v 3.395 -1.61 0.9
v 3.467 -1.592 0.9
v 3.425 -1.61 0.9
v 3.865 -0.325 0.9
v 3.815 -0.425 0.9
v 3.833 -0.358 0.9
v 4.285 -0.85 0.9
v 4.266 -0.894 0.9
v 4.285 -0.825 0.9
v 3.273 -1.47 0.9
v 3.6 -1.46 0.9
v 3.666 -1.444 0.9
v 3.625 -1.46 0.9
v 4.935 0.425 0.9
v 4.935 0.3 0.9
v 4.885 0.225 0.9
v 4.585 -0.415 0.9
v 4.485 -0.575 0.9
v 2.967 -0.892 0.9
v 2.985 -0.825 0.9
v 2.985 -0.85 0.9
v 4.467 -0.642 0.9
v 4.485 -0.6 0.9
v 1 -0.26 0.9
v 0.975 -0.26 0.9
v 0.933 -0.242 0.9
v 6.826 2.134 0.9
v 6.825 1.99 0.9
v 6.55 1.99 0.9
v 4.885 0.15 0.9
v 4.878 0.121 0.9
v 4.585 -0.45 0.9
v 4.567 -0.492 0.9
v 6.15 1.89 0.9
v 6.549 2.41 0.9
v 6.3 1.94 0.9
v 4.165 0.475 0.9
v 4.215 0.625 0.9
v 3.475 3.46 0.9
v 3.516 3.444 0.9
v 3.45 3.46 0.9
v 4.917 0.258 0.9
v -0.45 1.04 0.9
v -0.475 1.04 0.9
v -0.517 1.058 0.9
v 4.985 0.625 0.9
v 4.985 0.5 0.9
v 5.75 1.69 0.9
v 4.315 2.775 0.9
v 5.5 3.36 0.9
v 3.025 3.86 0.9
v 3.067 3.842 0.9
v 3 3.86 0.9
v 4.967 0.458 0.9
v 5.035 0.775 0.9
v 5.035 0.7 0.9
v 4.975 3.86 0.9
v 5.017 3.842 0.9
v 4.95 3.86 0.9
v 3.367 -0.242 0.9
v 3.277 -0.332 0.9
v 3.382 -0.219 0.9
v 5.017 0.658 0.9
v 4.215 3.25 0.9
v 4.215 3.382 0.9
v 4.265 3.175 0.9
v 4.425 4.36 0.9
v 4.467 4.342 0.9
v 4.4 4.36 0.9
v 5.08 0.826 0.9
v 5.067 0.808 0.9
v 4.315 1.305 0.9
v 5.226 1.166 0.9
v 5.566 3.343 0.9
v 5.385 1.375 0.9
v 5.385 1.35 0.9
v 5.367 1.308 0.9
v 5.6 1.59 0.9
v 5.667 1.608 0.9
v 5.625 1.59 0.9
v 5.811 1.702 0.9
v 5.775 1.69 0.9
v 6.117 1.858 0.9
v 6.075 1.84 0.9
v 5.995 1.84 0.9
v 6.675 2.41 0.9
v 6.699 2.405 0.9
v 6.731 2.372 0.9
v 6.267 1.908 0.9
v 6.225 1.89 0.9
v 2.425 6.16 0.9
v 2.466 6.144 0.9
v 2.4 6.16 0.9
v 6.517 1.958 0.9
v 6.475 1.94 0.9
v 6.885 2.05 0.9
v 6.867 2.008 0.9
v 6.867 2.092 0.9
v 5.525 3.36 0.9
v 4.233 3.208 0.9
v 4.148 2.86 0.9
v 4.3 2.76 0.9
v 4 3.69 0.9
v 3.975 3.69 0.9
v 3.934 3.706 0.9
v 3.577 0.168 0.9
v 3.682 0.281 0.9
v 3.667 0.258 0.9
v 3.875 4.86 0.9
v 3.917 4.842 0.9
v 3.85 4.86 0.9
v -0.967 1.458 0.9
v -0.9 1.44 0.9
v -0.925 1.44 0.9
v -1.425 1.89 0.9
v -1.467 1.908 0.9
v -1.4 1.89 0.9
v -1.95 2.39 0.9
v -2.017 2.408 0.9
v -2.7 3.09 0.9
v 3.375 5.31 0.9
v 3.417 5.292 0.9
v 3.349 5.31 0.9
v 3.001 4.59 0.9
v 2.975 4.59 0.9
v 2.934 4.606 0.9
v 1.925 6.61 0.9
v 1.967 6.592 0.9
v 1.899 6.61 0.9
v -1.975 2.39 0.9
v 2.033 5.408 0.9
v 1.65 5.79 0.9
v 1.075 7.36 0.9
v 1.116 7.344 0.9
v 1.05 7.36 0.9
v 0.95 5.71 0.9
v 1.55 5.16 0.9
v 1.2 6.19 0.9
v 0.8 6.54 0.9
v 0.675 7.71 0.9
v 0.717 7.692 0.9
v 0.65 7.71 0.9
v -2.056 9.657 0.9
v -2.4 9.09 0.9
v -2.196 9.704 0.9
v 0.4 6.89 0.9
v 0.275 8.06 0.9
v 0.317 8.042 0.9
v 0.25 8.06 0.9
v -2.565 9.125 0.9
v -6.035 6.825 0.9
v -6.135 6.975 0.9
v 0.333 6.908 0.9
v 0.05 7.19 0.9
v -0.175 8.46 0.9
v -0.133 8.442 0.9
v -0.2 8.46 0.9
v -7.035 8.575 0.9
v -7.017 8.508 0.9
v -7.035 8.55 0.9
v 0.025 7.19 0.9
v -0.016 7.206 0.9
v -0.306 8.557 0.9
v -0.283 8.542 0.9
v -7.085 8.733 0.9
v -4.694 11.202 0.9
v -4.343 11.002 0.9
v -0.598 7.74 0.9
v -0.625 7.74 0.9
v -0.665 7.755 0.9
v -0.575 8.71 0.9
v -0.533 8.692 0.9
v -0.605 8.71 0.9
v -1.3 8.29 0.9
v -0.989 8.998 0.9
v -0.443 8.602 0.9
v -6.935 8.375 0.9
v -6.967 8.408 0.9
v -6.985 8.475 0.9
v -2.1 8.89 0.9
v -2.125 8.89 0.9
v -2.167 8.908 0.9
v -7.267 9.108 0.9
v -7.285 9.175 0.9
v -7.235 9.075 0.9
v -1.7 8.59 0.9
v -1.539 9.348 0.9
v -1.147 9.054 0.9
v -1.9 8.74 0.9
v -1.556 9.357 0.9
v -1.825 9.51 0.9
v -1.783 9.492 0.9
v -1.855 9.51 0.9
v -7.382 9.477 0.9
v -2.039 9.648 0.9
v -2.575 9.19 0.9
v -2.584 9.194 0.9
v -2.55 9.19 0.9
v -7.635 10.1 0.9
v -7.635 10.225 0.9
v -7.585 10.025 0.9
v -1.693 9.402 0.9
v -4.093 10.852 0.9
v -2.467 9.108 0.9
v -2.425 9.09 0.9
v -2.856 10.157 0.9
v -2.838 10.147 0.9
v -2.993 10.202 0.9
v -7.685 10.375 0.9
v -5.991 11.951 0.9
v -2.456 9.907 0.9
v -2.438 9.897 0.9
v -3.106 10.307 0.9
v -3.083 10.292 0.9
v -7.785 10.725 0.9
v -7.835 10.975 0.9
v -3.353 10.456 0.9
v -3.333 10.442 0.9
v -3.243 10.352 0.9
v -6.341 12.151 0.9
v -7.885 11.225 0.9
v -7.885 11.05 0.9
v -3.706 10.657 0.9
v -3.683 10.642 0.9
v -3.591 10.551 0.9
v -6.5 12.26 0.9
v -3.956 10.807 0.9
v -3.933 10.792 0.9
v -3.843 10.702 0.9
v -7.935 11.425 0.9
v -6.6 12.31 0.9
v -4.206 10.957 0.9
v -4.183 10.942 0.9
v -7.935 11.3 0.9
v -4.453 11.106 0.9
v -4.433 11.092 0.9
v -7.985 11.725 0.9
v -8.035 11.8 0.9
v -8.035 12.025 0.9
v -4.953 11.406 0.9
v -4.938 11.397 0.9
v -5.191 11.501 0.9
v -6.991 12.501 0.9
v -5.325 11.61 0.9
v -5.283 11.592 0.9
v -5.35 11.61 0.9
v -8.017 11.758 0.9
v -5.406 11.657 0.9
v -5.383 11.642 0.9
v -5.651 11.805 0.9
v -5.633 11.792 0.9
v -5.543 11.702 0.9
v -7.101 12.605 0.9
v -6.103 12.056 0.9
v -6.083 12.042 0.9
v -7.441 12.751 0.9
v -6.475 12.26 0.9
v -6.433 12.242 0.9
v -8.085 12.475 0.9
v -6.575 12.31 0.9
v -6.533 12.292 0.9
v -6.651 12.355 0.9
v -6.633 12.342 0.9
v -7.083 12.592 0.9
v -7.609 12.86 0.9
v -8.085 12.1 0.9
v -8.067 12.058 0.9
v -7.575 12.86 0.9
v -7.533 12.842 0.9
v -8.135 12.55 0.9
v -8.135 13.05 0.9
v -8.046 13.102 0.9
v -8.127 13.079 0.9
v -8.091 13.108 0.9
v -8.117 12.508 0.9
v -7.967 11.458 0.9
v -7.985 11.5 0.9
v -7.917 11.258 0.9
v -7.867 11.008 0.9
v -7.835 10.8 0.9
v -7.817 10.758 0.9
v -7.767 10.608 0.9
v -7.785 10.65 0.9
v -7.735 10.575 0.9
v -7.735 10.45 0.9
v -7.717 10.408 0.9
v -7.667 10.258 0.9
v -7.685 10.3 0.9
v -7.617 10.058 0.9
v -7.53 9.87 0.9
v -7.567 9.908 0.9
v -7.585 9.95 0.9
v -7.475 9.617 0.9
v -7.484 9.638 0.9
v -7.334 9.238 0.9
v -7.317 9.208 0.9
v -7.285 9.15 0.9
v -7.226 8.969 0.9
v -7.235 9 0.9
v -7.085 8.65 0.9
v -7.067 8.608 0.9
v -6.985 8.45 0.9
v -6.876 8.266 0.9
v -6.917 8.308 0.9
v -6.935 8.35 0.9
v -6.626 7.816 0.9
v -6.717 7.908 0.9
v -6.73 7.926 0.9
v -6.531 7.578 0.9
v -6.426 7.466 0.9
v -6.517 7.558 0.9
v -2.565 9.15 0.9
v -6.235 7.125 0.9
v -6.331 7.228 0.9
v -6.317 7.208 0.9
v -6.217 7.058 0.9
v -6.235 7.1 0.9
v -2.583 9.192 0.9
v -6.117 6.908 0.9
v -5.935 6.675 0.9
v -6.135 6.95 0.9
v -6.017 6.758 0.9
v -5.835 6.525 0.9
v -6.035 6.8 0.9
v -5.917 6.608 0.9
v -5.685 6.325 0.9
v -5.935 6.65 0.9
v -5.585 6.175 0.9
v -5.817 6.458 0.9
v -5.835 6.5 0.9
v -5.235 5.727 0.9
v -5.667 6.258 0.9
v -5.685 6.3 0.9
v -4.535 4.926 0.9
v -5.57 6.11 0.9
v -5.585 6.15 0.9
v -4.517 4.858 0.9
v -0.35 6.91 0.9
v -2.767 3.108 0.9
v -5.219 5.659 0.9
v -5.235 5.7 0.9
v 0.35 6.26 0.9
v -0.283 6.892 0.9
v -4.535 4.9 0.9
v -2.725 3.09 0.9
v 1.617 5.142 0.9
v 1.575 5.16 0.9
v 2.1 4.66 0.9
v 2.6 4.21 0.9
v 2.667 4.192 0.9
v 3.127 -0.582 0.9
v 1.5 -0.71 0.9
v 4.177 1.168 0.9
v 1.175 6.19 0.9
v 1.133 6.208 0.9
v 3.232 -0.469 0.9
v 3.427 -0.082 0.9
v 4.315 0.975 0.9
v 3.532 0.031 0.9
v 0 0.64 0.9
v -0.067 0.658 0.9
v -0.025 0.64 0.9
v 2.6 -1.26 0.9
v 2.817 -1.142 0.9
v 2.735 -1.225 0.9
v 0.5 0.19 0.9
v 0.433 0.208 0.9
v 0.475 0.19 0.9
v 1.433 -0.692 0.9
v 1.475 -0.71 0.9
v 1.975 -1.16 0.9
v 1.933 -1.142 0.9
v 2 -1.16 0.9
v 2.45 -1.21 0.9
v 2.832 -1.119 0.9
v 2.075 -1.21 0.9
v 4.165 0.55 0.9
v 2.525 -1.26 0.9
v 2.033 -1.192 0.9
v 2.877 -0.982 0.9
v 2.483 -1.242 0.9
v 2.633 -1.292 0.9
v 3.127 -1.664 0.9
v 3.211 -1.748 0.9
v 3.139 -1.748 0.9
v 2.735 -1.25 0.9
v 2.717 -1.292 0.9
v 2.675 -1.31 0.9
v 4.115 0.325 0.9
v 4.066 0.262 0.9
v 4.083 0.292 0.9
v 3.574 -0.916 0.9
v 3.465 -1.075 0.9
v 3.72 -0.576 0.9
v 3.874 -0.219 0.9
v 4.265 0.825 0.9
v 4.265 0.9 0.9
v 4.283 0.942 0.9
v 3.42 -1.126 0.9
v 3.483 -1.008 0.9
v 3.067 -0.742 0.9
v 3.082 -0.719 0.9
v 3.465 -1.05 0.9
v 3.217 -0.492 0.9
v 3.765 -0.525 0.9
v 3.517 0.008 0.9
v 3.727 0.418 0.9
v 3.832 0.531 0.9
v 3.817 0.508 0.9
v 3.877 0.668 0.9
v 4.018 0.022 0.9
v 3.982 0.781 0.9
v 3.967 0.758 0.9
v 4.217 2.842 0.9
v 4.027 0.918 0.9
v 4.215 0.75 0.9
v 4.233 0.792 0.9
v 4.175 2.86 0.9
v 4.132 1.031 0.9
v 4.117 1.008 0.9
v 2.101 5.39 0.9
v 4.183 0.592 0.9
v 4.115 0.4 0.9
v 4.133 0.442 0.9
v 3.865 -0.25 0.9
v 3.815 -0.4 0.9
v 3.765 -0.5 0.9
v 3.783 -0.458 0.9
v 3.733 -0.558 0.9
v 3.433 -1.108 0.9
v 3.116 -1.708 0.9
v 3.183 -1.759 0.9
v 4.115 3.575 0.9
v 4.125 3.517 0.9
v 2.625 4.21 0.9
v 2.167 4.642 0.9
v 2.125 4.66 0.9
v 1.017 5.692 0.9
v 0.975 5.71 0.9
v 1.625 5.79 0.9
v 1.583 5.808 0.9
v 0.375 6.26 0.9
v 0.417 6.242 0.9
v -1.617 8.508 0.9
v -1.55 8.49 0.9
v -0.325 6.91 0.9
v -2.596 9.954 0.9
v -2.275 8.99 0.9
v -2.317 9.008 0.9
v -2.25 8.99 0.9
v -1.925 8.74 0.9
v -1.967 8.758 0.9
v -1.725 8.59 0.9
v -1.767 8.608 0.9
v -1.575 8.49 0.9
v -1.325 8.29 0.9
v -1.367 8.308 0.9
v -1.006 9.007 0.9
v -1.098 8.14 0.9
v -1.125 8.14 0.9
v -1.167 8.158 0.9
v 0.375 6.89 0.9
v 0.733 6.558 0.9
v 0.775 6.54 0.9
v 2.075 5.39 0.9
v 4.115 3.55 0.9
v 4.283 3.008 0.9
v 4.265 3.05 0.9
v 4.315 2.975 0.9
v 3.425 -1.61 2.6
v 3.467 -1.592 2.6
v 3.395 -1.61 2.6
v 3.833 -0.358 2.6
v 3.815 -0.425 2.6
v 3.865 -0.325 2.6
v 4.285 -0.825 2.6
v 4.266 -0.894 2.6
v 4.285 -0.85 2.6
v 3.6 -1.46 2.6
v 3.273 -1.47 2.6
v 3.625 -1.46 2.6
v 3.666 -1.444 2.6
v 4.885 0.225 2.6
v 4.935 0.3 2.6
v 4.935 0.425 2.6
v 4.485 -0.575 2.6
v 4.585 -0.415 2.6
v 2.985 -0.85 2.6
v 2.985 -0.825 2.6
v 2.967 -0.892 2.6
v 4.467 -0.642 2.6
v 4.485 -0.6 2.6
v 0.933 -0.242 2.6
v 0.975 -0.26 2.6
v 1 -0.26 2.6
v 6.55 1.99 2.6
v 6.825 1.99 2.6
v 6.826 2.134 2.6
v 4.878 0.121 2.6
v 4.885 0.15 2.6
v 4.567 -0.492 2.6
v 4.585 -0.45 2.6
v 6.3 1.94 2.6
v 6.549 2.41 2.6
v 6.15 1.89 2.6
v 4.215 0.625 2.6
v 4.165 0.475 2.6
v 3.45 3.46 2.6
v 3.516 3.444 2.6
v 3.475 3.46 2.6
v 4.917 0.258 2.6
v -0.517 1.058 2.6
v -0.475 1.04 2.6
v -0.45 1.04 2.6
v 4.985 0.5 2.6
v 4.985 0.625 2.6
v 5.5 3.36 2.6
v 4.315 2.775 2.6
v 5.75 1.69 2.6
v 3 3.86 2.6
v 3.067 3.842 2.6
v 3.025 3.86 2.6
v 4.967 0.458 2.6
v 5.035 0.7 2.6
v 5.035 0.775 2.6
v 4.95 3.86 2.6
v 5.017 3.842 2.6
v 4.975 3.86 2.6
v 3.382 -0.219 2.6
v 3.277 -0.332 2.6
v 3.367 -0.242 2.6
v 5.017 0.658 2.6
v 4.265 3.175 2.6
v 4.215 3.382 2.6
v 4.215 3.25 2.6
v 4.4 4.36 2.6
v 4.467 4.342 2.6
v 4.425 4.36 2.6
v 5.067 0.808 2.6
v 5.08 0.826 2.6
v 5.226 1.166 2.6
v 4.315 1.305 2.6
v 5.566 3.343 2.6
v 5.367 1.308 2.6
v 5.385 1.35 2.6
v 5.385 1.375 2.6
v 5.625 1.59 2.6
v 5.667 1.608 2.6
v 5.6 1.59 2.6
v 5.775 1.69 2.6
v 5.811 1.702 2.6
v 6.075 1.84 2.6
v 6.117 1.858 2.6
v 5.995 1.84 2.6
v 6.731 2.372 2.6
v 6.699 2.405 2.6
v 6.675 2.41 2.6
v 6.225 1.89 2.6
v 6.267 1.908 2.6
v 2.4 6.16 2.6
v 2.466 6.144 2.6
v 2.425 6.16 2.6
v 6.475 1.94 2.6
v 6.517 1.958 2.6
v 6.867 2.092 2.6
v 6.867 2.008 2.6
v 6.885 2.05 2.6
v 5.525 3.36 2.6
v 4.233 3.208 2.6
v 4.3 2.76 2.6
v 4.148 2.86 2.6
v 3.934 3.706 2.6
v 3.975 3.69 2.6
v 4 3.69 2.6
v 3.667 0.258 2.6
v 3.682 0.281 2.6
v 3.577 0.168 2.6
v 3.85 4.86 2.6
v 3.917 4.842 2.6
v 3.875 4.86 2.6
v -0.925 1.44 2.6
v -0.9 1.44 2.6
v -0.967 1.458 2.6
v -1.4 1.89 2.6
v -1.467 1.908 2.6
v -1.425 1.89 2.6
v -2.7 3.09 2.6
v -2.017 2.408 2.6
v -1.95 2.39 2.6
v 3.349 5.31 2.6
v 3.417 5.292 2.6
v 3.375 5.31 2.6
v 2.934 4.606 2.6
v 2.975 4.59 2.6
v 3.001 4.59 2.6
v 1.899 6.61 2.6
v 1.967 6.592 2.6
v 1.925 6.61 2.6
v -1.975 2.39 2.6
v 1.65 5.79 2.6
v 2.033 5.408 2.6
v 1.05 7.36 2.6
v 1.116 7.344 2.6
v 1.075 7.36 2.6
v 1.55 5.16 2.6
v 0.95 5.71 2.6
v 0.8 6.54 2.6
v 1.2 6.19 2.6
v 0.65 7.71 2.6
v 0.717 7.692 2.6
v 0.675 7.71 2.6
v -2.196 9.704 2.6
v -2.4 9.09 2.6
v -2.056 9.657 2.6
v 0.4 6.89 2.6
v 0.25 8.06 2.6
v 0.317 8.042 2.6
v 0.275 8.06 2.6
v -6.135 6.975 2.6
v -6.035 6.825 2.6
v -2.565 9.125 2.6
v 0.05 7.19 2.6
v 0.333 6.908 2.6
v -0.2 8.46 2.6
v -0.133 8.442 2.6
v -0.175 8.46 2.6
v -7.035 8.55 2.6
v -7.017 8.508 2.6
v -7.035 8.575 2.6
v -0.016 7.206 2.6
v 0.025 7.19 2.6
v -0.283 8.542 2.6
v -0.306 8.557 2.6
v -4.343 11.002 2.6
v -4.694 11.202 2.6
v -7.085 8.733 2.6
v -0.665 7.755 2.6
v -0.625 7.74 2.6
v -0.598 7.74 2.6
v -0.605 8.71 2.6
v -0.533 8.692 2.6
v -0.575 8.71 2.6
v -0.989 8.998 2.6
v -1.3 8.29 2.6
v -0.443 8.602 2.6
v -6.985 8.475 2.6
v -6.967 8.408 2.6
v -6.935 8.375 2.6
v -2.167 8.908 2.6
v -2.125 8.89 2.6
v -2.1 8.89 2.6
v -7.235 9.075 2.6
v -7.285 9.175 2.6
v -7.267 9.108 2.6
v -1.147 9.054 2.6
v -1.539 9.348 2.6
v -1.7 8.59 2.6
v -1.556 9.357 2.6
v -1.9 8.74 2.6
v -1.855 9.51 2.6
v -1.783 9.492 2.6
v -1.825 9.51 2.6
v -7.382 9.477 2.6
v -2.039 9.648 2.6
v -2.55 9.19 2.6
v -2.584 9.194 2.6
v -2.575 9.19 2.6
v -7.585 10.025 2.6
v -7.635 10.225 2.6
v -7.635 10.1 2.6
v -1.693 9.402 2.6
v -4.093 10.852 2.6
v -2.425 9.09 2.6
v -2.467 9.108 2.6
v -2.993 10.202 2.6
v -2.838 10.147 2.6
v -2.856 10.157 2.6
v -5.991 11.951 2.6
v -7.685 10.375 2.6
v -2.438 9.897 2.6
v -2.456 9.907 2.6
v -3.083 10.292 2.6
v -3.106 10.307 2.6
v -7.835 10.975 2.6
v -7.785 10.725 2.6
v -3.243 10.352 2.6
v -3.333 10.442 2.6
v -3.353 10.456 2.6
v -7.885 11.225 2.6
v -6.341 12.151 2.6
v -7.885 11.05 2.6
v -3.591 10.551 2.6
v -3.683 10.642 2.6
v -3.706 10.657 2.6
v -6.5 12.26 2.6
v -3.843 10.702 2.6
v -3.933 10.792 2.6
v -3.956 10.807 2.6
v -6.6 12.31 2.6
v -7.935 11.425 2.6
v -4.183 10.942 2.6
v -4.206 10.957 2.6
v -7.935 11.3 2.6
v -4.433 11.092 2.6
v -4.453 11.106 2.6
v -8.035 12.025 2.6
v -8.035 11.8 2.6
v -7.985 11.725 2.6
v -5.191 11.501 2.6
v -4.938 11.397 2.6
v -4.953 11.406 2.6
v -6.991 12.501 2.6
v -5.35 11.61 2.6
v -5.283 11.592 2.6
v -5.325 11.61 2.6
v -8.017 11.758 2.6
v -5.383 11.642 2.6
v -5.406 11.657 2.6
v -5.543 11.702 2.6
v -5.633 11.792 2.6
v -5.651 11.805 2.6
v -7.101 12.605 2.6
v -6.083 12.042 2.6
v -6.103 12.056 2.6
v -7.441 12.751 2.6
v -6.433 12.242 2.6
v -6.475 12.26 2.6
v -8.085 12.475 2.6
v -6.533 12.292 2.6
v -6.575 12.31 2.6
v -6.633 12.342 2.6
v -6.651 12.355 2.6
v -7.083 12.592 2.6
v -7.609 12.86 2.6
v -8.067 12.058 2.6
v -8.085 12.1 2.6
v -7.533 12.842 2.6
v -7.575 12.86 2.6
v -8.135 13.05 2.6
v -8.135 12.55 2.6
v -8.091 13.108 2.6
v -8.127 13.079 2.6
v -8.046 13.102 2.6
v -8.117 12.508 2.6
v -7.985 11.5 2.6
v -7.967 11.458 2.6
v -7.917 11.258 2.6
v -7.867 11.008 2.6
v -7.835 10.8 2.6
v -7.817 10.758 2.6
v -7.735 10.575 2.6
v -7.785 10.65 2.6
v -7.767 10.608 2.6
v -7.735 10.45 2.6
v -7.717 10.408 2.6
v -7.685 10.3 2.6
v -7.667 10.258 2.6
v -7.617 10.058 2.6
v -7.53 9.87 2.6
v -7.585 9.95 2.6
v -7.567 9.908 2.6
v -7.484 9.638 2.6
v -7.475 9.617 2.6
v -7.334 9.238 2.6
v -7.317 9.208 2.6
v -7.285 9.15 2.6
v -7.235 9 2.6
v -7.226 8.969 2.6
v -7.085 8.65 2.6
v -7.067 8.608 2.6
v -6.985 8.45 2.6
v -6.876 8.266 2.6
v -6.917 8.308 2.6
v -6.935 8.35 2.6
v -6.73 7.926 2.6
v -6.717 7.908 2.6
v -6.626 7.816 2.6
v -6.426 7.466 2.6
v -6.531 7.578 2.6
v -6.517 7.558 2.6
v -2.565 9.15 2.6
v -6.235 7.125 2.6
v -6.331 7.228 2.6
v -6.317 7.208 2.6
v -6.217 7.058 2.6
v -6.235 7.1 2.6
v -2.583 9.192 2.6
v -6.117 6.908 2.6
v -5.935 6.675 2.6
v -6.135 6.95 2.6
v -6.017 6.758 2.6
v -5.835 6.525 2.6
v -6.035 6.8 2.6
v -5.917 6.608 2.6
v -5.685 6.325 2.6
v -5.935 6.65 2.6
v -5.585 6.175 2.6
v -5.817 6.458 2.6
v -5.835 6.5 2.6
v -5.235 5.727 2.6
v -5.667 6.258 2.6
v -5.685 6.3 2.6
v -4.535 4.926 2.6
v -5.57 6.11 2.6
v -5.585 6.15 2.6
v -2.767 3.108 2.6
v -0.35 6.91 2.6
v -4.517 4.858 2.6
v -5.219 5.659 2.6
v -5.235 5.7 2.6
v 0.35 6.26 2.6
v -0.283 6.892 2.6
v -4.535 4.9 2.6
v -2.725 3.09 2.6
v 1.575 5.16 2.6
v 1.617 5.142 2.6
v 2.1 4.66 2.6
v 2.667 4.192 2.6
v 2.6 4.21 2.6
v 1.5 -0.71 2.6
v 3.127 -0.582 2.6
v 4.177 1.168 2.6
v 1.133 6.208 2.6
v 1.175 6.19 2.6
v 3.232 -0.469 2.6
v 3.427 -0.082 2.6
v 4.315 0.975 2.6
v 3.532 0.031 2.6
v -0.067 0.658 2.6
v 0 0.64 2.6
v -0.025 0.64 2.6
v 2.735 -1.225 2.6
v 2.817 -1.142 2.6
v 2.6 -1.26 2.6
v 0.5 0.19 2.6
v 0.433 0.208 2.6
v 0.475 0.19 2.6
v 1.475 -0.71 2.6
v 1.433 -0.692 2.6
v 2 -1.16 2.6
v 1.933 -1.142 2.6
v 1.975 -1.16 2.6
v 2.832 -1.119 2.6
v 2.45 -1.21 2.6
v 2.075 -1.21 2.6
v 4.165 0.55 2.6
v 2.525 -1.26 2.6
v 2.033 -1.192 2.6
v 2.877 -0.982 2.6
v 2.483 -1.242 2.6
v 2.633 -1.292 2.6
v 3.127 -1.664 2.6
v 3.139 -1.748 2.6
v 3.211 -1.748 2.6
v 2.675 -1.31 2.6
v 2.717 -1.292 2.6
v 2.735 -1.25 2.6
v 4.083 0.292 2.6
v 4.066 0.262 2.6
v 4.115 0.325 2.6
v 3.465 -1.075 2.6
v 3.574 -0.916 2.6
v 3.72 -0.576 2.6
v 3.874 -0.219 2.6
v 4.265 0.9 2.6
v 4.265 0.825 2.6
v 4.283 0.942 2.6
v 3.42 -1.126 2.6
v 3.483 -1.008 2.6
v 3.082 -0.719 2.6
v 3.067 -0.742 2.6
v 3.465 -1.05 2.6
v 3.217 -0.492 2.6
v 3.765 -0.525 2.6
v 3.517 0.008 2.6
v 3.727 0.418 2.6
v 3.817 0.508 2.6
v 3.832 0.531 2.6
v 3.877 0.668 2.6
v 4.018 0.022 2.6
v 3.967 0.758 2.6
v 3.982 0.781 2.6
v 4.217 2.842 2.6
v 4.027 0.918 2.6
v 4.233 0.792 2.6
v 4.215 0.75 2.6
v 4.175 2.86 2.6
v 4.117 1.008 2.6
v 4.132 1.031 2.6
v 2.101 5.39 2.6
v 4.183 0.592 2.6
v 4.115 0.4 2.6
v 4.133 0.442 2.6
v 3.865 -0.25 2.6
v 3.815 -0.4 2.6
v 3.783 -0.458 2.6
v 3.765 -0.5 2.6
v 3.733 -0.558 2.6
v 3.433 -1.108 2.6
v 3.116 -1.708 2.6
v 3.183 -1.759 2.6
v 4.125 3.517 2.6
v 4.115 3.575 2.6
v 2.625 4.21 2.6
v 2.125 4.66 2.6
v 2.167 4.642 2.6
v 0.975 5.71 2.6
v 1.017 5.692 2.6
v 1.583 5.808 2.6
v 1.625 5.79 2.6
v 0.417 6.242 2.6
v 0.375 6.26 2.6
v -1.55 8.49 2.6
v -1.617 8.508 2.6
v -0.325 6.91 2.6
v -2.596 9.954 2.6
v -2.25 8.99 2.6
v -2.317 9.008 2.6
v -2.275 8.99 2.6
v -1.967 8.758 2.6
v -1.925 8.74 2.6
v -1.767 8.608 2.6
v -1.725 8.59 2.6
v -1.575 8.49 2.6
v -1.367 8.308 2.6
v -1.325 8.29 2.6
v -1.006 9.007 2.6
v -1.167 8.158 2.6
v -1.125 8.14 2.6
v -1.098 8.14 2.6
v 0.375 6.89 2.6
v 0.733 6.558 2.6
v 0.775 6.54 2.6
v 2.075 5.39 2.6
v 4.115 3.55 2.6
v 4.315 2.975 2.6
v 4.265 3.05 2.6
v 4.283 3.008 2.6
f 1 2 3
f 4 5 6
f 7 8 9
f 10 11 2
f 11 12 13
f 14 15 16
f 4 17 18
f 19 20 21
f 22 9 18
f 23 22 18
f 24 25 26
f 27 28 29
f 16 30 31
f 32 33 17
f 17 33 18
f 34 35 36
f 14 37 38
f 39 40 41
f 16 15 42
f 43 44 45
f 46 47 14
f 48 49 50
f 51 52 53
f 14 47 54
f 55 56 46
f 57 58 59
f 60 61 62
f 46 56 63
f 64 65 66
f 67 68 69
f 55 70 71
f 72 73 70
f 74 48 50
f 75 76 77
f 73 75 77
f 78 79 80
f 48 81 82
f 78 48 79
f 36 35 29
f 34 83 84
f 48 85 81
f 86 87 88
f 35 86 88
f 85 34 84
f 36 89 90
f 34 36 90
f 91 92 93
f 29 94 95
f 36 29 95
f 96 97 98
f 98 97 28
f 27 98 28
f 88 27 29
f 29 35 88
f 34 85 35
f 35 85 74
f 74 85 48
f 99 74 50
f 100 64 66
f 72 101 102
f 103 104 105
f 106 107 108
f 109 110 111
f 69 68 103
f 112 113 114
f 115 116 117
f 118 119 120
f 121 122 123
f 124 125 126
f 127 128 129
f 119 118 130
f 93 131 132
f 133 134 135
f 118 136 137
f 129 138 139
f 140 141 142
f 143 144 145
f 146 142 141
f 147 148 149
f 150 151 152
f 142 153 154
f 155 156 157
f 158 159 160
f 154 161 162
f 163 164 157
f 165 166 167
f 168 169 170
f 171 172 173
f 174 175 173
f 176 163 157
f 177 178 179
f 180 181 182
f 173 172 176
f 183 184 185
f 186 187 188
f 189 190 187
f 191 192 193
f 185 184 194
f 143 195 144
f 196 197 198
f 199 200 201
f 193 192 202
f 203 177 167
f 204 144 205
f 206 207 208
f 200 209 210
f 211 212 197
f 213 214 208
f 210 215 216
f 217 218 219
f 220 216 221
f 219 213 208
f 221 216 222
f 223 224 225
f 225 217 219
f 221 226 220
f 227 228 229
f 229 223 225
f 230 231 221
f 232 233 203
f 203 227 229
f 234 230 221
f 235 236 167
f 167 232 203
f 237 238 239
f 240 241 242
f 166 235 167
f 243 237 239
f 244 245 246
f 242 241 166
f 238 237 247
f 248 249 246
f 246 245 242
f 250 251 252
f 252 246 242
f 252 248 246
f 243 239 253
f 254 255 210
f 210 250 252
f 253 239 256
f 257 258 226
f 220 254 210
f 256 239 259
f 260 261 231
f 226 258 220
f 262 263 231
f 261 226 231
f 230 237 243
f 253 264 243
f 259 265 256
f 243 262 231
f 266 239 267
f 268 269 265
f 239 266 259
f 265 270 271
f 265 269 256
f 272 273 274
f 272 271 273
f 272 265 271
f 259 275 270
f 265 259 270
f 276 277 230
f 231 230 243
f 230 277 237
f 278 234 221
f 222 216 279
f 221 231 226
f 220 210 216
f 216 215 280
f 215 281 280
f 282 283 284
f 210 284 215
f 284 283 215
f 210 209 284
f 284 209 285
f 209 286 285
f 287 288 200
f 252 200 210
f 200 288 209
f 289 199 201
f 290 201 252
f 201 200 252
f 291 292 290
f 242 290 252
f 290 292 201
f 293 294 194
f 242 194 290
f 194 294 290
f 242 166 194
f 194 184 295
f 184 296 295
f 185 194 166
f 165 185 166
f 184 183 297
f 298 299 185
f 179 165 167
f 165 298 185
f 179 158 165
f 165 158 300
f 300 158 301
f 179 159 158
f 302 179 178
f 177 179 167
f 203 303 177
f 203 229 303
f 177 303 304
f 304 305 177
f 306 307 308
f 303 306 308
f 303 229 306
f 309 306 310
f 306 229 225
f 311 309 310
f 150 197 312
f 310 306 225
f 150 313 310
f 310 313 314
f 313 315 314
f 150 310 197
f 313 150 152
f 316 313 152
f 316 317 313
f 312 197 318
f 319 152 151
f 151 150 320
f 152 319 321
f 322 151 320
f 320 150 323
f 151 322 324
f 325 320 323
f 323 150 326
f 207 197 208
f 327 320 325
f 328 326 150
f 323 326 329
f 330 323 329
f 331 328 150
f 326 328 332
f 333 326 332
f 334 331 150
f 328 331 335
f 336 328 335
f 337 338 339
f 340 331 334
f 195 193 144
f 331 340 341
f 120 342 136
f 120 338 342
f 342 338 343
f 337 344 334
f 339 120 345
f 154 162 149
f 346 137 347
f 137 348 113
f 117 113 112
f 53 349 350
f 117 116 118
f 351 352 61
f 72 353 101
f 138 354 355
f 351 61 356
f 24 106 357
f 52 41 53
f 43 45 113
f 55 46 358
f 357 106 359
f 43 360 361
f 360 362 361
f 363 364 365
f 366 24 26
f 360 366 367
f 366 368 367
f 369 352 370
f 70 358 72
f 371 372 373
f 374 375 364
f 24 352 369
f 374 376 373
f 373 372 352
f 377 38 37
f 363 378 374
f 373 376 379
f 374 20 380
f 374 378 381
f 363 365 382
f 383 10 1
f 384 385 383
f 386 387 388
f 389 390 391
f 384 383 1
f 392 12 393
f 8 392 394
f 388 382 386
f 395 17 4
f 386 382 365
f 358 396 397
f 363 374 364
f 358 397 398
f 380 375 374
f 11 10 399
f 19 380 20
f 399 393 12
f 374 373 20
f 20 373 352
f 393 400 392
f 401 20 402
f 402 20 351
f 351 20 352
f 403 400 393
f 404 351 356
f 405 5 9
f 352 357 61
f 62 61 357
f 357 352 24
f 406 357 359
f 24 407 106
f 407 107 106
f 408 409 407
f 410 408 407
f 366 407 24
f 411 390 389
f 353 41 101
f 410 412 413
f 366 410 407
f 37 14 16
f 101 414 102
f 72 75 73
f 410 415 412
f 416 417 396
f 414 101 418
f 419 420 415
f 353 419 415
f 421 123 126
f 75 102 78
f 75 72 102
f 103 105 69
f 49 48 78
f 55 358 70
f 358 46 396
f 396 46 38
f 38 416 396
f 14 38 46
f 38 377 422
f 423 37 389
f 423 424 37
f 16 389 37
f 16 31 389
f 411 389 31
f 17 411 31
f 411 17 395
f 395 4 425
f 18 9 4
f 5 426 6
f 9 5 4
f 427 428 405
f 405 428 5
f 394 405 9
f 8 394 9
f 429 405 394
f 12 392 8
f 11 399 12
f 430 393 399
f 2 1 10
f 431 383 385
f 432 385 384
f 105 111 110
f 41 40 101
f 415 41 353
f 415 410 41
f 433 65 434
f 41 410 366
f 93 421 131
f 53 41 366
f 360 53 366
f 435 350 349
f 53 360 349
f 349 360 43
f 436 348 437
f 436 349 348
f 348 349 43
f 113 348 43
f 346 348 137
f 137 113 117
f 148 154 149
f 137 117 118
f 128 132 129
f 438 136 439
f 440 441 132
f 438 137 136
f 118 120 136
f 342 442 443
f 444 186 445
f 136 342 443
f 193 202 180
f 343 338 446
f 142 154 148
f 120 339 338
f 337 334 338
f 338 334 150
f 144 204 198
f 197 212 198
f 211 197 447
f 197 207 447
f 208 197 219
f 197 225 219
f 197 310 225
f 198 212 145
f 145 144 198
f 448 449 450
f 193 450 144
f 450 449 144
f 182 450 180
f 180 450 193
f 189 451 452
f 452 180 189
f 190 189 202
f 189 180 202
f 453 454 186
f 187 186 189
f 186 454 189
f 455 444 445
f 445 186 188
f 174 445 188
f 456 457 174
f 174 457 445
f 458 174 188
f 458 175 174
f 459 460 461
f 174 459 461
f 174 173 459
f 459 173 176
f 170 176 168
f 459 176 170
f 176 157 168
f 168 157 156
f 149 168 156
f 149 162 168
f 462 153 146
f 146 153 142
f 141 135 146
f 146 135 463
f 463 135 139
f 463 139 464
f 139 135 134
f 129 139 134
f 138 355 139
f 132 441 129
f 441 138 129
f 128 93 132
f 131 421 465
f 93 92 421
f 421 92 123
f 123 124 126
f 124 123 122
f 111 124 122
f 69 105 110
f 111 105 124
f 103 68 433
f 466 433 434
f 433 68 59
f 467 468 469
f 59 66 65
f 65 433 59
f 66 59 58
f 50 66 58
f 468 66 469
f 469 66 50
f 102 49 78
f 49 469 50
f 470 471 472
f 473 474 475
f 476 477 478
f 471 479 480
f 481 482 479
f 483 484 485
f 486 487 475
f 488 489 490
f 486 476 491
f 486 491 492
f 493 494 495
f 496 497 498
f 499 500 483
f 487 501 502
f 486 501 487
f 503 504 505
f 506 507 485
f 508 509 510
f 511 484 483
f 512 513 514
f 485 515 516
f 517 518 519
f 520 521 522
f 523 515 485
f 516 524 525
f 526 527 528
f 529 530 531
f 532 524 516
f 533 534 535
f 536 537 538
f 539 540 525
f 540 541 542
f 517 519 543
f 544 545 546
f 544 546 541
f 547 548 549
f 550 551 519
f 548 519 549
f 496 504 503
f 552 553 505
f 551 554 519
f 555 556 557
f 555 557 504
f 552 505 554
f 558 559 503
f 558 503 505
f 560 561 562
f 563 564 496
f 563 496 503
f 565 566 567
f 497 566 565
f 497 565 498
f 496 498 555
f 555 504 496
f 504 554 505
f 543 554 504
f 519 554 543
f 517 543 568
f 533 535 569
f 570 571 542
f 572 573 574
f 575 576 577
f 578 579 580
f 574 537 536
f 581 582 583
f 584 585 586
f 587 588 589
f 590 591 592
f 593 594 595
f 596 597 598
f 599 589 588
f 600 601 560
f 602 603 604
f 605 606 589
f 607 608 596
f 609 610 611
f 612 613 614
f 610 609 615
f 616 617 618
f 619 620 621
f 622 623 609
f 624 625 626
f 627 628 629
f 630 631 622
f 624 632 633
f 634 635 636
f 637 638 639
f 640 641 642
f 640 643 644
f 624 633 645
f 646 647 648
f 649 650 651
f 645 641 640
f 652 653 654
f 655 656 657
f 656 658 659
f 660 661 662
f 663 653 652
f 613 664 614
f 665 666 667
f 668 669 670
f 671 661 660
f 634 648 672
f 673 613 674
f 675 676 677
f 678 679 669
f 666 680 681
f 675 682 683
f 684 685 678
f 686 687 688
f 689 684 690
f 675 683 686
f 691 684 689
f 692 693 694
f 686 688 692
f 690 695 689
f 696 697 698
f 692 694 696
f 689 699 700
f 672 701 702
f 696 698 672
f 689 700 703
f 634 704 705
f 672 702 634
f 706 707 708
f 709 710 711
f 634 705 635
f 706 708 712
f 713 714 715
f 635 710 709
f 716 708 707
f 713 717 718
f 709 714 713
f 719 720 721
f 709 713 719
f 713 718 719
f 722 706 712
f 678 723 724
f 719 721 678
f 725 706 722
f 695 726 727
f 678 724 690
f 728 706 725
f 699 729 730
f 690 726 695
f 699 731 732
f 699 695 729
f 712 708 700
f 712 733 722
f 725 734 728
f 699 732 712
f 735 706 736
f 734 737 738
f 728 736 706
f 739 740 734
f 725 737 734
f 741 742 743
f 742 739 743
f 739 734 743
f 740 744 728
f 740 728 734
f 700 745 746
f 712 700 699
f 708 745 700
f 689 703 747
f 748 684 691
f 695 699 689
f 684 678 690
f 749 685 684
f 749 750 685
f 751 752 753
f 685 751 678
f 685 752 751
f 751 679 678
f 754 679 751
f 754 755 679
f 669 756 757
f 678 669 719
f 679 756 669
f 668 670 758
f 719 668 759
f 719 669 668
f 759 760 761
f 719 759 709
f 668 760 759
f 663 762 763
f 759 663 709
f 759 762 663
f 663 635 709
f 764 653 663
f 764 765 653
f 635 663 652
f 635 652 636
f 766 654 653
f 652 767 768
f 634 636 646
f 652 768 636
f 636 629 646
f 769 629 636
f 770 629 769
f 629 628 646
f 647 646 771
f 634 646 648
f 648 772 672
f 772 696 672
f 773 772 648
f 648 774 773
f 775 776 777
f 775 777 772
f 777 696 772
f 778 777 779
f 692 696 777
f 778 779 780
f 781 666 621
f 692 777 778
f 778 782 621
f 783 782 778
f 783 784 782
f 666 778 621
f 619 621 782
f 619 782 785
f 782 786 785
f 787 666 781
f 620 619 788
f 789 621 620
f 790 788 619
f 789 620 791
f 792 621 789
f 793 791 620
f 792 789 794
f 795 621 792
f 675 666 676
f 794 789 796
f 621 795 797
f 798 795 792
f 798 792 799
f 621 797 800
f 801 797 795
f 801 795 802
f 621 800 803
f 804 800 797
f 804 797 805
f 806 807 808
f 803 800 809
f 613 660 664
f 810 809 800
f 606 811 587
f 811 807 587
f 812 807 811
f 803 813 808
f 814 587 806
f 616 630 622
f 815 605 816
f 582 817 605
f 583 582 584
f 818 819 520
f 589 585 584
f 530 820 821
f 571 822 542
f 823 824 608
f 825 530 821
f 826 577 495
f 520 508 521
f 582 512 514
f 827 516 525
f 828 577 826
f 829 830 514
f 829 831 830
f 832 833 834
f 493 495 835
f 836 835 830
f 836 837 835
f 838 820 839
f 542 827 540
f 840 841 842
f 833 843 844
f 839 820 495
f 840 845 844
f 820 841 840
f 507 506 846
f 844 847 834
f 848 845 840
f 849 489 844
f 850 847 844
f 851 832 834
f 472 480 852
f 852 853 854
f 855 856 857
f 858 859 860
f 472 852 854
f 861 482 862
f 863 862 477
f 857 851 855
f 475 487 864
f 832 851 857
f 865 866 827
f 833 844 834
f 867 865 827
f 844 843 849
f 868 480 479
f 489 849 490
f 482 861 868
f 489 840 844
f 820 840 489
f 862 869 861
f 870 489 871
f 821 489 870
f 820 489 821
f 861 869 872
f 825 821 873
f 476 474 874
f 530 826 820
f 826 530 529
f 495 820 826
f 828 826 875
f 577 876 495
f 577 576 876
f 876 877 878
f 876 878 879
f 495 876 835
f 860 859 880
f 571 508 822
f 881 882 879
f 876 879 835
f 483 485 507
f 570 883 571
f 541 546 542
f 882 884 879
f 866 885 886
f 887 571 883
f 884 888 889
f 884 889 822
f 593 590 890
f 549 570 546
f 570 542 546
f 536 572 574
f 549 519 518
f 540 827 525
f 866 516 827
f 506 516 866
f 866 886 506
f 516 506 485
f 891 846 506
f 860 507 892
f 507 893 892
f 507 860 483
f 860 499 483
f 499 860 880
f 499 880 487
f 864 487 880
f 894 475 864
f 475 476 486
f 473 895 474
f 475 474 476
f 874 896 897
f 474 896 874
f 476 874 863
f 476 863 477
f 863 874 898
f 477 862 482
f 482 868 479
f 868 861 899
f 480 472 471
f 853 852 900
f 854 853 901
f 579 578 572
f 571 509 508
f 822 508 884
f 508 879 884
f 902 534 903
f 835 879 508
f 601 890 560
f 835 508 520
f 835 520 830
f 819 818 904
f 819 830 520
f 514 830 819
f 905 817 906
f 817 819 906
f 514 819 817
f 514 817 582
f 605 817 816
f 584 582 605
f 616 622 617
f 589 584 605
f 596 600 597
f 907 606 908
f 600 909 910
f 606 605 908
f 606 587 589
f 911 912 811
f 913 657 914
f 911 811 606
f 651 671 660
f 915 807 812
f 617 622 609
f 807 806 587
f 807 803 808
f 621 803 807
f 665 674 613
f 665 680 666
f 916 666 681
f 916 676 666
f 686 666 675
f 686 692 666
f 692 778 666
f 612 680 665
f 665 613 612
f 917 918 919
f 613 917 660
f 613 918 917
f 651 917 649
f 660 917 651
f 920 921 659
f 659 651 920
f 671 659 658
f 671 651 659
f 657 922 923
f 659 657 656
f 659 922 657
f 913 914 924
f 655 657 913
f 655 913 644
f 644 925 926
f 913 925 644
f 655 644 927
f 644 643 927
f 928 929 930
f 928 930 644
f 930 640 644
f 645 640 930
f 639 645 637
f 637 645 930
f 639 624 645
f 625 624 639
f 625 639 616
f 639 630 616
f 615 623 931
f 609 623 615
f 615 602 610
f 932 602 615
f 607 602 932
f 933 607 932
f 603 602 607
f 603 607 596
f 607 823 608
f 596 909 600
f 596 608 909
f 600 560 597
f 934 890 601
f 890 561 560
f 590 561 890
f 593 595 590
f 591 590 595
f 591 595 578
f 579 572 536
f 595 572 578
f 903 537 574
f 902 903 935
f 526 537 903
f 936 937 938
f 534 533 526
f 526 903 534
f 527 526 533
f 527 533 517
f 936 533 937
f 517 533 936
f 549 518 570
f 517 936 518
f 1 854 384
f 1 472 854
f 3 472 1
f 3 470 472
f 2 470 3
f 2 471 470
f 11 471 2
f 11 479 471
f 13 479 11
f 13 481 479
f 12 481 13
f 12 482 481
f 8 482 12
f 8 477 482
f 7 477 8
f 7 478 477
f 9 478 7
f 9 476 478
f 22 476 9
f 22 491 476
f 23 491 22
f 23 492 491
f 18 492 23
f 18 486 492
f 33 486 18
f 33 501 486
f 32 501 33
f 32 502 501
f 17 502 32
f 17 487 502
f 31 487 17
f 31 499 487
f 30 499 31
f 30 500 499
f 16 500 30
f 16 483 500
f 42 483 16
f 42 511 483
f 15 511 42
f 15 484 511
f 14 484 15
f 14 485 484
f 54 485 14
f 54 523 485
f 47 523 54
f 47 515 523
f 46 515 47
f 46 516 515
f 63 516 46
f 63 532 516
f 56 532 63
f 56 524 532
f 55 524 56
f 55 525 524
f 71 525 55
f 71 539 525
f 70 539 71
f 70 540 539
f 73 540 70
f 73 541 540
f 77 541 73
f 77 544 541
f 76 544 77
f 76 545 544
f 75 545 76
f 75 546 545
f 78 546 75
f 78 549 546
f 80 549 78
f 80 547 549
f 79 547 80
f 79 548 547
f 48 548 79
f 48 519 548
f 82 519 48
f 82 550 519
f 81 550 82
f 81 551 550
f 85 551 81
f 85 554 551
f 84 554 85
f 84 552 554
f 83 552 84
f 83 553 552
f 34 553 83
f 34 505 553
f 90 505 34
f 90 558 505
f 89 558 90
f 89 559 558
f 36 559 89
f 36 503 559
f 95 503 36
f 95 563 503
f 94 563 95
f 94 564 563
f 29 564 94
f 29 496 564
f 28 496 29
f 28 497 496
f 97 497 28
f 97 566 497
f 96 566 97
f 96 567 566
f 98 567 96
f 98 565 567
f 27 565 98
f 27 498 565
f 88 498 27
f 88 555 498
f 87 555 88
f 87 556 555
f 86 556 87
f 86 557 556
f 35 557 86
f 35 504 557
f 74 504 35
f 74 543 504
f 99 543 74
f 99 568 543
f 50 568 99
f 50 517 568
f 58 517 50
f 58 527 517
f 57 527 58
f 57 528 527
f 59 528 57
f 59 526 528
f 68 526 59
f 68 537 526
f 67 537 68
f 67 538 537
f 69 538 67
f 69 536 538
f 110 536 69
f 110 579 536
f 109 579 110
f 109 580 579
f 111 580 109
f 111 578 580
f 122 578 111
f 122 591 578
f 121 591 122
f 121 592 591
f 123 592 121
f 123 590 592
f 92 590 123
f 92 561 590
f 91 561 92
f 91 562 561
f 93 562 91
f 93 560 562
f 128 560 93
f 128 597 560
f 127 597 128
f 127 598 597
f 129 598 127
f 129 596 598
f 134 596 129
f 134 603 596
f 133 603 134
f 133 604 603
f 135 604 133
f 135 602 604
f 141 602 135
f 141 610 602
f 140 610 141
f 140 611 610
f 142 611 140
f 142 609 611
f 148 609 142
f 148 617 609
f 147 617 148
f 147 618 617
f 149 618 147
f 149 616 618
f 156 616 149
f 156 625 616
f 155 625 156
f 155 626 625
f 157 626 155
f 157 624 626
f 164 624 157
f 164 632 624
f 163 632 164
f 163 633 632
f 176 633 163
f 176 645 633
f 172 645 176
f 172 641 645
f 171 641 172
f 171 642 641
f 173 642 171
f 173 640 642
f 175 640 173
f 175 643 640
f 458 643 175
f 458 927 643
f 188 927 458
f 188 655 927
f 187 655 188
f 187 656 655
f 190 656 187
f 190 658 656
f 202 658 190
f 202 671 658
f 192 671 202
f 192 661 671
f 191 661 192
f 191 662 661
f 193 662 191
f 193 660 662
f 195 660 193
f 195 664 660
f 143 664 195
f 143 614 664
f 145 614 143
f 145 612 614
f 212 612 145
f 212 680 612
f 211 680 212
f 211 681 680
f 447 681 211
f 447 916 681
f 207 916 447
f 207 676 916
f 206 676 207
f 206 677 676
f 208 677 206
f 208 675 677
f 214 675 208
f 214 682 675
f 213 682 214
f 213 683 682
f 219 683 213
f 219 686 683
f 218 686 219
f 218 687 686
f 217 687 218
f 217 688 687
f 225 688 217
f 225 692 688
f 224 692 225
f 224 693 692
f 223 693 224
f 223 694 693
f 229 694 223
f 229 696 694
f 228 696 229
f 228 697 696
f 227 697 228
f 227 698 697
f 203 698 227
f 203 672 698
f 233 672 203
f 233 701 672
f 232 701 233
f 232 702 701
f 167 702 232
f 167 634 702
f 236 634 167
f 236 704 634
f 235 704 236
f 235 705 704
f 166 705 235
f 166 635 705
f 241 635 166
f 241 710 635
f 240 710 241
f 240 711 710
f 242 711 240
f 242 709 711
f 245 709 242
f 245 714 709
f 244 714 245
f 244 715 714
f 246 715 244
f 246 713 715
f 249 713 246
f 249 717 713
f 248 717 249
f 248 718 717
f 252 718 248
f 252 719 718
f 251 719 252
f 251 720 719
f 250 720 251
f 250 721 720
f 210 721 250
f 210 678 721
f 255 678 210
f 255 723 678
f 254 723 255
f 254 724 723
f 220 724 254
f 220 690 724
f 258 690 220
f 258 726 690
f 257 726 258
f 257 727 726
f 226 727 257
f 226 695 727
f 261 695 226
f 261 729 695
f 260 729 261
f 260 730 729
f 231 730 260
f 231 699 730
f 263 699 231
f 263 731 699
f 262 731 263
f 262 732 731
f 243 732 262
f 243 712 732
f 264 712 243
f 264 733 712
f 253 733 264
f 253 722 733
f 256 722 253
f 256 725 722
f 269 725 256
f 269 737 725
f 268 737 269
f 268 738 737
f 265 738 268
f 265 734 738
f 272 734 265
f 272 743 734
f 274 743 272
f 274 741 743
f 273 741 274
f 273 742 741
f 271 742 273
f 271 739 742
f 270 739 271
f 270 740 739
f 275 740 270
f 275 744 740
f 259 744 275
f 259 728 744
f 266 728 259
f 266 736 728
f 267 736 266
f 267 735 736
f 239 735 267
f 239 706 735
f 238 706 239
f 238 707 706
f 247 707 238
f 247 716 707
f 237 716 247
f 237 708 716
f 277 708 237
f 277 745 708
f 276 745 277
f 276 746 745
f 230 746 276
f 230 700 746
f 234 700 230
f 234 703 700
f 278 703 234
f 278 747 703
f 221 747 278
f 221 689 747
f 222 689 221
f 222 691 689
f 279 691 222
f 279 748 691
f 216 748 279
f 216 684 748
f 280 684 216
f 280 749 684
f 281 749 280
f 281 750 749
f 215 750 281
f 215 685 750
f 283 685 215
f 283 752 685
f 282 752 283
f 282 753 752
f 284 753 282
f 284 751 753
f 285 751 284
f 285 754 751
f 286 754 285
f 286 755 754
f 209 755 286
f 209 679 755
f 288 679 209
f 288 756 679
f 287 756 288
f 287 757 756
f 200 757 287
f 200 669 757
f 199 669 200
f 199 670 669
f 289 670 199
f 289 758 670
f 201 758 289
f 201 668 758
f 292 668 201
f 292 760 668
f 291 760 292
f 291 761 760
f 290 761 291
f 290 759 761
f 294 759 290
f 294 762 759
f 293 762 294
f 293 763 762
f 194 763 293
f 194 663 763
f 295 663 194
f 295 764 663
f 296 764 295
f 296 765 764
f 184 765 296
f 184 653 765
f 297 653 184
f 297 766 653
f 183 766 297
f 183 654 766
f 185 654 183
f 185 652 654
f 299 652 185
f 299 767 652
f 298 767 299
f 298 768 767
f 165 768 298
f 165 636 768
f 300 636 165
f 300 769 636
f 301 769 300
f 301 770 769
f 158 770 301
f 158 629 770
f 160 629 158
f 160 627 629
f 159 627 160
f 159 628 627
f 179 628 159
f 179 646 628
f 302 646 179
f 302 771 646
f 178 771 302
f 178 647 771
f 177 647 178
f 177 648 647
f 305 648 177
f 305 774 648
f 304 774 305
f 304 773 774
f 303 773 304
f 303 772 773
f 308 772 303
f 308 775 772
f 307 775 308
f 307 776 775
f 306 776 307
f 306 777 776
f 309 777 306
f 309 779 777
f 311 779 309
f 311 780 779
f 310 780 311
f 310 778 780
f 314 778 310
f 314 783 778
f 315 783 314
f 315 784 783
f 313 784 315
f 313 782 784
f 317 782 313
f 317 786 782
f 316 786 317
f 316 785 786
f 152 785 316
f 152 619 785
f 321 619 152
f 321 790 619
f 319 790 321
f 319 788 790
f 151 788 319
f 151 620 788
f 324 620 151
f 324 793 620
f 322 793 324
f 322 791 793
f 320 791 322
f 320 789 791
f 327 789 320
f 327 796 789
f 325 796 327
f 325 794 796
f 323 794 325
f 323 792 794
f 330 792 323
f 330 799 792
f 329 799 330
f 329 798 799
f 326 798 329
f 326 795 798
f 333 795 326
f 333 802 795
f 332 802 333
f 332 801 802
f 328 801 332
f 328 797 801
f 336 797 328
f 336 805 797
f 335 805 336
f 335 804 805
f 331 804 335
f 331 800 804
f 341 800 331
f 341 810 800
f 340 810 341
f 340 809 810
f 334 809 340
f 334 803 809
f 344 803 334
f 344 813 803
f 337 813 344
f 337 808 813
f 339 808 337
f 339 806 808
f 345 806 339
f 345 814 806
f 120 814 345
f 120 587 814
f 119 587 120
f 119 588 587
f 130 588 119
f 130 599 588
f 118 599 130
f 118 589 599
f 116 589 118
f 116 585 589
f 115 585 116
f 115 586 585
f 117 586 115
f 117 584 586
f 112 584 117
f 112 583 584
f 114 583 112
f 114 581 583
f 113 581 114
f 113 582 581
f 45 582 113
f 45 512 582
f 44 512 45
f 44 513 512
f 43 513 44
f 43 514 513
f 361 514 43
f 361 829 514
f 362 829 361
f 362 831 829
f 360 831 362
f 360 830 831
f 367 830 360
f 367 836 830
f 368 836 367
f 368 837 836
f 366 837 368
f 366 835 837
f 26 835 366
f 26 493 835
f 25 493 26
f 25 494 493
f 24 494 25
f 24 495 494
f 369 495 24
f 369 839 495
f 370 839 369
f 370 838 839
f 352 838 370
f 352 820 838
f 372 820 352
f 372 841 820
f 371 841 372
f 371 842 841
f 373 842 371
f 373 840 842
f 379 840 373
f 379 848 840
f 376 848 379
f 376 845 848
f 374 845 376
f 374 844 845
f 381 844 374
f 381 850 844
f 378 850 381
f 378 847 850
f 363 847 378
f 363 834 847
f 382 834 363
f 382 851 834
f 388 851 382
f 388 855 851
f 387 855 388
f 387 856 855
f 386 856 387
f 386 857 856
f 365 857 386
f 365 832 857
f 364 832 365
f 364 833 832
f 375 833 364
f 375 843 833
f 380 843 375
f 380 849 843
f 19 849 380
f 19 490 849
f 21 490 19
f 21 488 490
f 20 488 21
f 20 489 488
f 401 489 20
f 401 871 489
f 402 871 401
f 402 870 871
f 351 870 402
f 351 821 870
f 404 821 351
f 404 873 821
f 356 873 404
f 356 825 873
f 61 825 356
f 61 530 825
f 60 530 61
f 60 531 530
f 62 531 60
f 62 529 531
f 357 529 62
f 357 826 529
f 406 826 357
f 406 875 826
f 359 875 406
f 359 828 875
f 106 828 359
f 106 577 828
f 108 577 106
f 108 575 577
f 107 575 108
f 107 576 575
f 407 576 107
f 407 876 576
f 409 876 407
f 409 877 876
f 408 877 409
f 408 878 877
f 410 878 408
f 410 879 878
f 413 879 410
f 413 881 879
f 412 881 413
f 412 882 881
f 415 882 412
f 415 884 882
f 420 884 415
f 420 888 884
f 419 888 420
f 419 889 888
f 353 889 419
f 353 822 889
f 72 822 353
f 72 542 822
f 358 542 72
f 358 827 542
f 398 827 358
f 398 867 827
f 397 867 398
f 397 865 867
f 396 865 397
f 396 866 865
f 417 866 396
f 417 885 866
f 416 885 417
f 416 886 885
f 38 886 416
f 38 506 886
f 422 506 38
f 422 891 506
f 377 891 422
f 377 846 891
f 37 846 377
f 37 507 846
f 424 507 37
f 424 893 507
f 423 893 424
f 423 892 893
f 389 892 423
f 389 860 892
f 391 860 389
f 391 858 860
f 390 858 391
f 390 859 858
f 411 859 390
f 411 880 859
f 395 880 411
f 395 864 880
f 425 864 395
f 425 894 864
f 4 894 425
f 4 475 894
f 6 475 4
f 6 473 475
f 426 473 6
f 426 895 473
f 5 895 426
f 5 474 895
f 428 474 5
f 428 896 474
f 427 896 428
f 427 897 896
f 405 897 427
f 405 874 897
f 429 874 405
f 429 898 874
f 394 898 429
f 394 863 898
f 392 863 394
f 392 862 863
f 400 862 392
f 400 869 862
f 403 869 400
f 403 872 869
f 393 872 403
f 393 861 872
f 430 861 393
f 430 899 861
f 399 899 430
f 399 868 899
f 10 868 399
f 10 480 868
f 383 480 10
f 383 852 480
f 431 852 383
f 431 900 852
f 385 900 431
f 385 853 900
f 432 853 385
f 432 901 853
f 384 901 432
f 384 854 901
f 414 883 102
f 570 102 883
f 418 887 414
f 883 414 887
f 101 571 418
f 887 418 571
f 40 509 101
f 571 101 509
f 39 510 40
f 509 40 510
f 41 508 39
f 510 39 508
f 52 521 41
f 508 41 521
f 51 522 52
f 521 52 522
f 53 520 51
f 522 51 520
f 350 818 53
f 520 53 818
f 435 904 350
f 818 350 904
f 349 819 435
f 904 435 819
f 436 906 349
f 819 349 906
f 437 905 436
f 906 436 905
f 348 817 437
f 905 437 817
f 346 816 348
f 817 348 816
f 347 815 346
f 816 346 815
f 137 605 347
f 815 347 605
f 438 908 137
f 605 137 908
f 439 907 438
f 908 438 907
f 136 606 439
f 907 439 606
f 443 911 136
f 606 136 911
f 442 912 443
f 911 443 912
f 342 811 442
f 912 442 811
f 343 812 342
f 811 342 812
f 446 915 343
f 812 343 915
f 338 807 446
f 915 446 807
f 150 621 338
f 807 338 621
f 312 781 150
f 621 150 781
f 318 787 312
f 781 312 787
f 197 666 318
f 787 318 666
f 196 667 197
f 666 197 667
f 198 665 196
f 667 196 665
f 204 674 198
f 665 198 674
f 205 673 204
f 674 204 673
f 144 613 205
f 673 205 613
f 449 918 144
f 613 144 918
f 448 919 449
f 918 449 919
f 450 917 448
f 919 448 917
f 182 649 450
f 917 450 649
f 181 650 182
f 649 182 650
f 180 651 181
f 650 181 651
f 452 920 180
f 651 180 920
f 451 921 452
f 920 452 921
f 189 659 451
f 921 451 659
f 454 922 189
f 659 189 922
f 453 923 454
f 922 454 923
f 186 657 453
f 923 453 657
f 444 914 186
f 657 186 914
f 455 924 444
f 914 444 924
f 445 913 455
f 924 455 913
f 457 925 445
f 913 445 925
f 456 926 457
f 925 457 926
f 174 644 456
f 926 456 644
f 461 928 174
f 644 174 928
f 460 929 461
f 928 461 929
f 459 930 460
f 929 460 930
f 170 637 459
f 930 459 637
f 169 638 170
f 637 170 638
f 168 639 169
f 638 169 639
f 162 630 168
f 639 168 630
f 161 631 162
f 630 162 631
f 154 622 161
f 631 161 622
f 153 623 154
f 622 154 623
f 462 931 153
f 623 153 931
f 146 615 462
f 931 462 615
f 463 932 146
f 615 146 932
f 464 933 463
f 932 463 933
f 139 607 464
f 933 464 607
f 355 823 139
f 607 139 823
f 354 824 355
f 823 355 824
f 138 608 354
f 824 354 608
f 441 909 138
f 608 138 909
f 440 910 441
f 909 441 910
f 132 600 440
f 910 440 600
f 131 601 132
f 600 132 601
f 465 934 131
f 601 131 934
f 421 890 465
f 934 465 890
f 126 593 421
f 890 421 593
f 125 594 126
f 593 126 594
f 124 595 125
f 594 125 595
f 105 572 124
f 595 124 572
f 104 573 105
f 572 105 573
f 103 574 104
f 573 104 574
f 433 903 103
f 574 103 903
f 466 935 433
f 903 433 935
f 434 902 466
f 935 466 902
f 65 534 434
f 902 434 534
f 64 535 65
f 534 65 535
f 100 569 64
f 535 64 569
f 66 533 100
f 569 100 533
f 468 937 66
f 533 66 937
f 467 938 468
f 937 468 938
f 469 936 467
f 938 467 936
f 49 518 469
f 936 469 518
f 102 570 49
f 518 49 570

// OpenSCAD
$fn = 24;
translate([0, 0.000, 0.900])
  linear_extrude(height=1.700) {
offset(r=0.06, $fn=8) {
    polygon(points=[[-8.075,13.050],[-8.075,12.550],[-8.025,12.500],[-8.025,12.100],[-7.975,12.050],[-7.975,11.800],[-7.925,11.750],[-7.925,11.500],[-7.875,11.450],[-7.875,11.300],[-7.825,11.250],[-7.825,11.050],[-7.775,11.000],[-7.775,10.800],[-7.725,10.750],[-7.725,10.650],[-7.675,10.600],[-7.675,10.450],[-7.625,10.400],[-7.625,10.300],[-7.575,10.250],[-7.575,10.100],[-7.525,10.050],[-7.525,9.950],[-7.475,9.900],[-7.425,9.650],[-7.325,9.500],[-7.275,9.250],[-7.225,9.200],[-7.225,9.150],[-7.175,9.100],[-7.175,9.000],[-7.025,8.750],[-7.025,8.650],[-6.975,8.600],[-6.975,8.550],[-6.925,8.500],[-6.925,8.450],[-6.875,8.400],[-6.875,8.350],[-6.825,8.300],[-6.675,7.950],[-6.575,7.850],[-6.475,7.600],[-6.375,7.500],[-6.275,7.250],[-6.175,7.150],[-6.175,7.100],[-6.075,7.000],[-6.075,6.950],[-5.975,6.850],[-5.975,6.800],[-5.875,6.700],[-5.875,6.650],[-5.775,6.550],[-5.775,6.500],[-5.625,6.350],[-5.625,6.300],[-5.525,6.200],[-5.525,6.150],[-5.175,5.750],[-5.175,5.700],[-4.475,4.950],[-4.475,4.900],[-2.725,3.150],[-2.675,3.150],[-1.975,2.450],[-1.925,2.450],[-1.425,1.950],[-1.375,1.950],[-0.925,1.500],[-0.875,1.500],[-0.475,1.100],[-0.425,1.100],[-0.025,0.700],[0.025,0.700],[0.475,0.250],[0.525,0.250],[0.975,-0.200],[1.025,-0.200],[1.475,-0.650],[1.525,-0.650],[1.975,-1.100],[2.025,-1.100],[2.075,-1.150],[2.475,-1.150],[2.525,-1.200],[2.625,-1.200],[2.675,-1.250],[2.675,-1.200],[2.775,-1.100],[2.825,-0.950],[2.925,-0.850],[2.925,-0.800],[3.025,-0.700],[3.075,-0.550],[3.175,-0.450],[3.225,-0.300],[3.325,-0.200],[3.375,-0.050],[3.475,0.050],[3.525,0.200],[3.625,0.300],[3.675,0.450],[3.775,0.550],[3.825,0.700],[3.925,0.800],[3.975,0.950],[4.075,1.050],[4.125,1.200],[4.325,1.400],[4.375,1.350],[4.375,0.950],[4.325,0.900],[4.325,0.800],[4.275,0.750],[4.275,0.600],[4.225,0.550],[4.225,0.450],[4.175,0.400],[4.175,0.300],[4.125,0.250],[4.075,0.000],[3.925,-0.250],[3.925,-0.350],[3.875,-0.400],[3.875,-0.450],[3.825,-0.500],[3.825,-0.550],[3.775,-0.600],[3.625,-0.950],[3.525,-1.050],[3.525,-1.100],[3.475,-1.150],[3.325,-1.500],[3.175,-1.700],[3.375,-1.550],[3.425,-1.550],[3.575,-1.400],[3.625,-1.400],[4.225,-0.850],[4.225,-0.800],[4.425,-0.600],[4.425,-0.550],[4.525,-0.450],[4.525,-0.400],[4.825,0.150],[4.825,0.250],[4.875,0.300],[4.875,0.450],[4.925,0.500],[4.925,0.650],[4.975,0.700],[4.975,0.800],[5.025,0.850],[5.175,1.200],[5.325,1.350],[5.325,1.400],[5.575,1.650],[5.625,1.650],[5.725,1.750],[5.775,1.750],[5.975,1.900],[6.075,1.900],[6.125,1.950],[6.225,1.950],[6.275,2.000],[6.475,2.000],[6.525,2.050],[6.825,2.050],[6.775,2.100],[6.675,2.350],[6.525,2.350],[5.525,3.300],[5.475,3.300],[4.975,3.800],[4.925,3.800],[4.425,4.300],[4.375,4.300],[3.875,4.800],[3.825,4.800],[3.375,5.250],[3.325,5.250],[2.425,6.100],[2.375,6.100],[1.925,6.550],[1.875,6.550],[1.075,7.300],[1.025,7.300],[0.675,7.650],[0.625,7.650],[0.275,8.000],[0.225,8.000],[-0.175,8.400],[-0.225,8.400],[-0.325,8.500],[-0.475,8.550],[-0.575,8.650],[-0.625,8.650],[-1.025,8.950],[-1.175,9.000],[-1.575,9.300],[-1.725,9.350],[-1.825,9.450],[-1.875,9.450],[-2.075,9.600],[-2.225,9.650],[-2.475,9.850],[-2.625,9.900],[-2.875,10.100],[-3.025,10.150],[-3.125,10.250],[-3.275,10.300],[-3.375,10.400],[-3.625,10.500],[-3.725,10.600],[-3.875,10.650],[-3.975,10.750],[-4.125,10.800],[-4.225,10.900],[-4.375,10.950],[-4.475,11.050],[-4.725,11.150],[-4.975,11.350],[-5.225,11.450],[-5.325,11.550],[-5.375,11.550],[-5.425,11.600],[-5.575,11.650],[-5.675,11.750],[-6.025,11.900],[-6.125,12.000],[-6.375,12.100],[-6.475,12.200],[-6.525,12.200],[-6.575,12.250],[-6.625,12.250],[-6.675,12.300],[-7.025,12.450],[-7.125,12.550],[-7.475,12.700],[-7.575,12.800],[-7.625,12.800],[-2.775,9.300],[-2.725,9.350],[-2.675,9.350],[-2.575,9.250],[-2.525,9.250],[-2.425,9.150],[-2.375,9.150],[-2.275,9.050],[-2.225,9.050],[-2.125,8.950],[-2.075,8.950],[-1.925,8.800],[-1.875,8.800],[-1.725,8.650],[-1.675,8.650],[-1.575,8.550],[-1.525,8.550],[-1.325,8.350],[-1.275,8.350],[-1.125,8.200],[-1.075,8.200],[-0.625,7.800],[-0.575,7.800],[0.025,7.250],[0.075,7.250],[0.375,6.950],[0.425,6.950],[0.775,6.600],[0.825,6.600],[1.175,6.250],[1.225,6.250],[1.625,5.850],[1.675,5.850],[2.075,5.450],[2.125,5.450],[2.975,4.650],[3.025,4.650],[3.975,3.750],[4.025,3.750],[4.175,3.600],[4.175,3.550],[4.275,3.400],[4.275,3.250],[4.325,3.200],[4.325,3.050],[4.375,3.000],[4.375,2.750],[4.325,2.700],[4.275,2.700],[4.175,2.800],[4.125,2.800],[3.475,3.400],[3.425,3.400],[3.025,3.800],[2.975,3.800],[2.625,4.150],[2.575,4.150],[2.125,4.600],[2.075,4.600],[1.575,5.100],[1.525,5.100],[0.975,5.650],[0.925,5.650],[0.375,6.200],[0.325,6.200],[-0.325,6.850],[-0.375,6.850],[-2.625,9.100],[-2.625,9.150]], paths=[[0,1,2,3,4,5,6,7,8,9,10,11,12,13,14,15,16,17,18,19,20,21,22,23,24,25,26,27,28,29,30,31,32,33,34,35,36,37,38,39,40,41,42,43,44,45,46,47,48,49,50,51,52,53,54,55,56,57,58,59,60,61,62,63,64,65,66,67,68,69,70,71,72,73,74,75,76,77,78,79,80,81,82,83,84,85,86,87,88,89,90,91,92,93,94,95,96,97,98,99,100,101,102,103,104,105,106,107,108,109,110,111,112,113,114,115,116,117,118,119,120,121,122,123,124,125,126,127,128,129,130,131,132,133,134,135,136,137,138,139,140,141,142,143,144,145,146,147,148,149,150,151,152,153,154,155,156,157,158,159,160,161,162,163,164,165,166,167,168,169,170,171,172,173,174,175,176,177,178,179,180,181,182,183,184,185,186,187,188,189,190,191,192,193,194,195,196,197,198,199,200,201,202,203,204,205,206,207,208,209,210,211,212,213,214,215,216,217,218,219,220,221,222,223,224,225,226,227,228,229,230,231,232,233,234,235,236,237,238,239,240,241,242],[243,244,245,246,247,248,249,250,251,252,253,254,255,256,257,258,259,260,261,262,263,264,265,266,267,268,269,270,271,272,273,274,275,276,277,278,279,280,281,282,283,284,285,286,287,288,289,290,291,292,293,294,295,296,297,298,299,300,301,302,303,304,305,306,307,308,309,310,311]]);
}
}
